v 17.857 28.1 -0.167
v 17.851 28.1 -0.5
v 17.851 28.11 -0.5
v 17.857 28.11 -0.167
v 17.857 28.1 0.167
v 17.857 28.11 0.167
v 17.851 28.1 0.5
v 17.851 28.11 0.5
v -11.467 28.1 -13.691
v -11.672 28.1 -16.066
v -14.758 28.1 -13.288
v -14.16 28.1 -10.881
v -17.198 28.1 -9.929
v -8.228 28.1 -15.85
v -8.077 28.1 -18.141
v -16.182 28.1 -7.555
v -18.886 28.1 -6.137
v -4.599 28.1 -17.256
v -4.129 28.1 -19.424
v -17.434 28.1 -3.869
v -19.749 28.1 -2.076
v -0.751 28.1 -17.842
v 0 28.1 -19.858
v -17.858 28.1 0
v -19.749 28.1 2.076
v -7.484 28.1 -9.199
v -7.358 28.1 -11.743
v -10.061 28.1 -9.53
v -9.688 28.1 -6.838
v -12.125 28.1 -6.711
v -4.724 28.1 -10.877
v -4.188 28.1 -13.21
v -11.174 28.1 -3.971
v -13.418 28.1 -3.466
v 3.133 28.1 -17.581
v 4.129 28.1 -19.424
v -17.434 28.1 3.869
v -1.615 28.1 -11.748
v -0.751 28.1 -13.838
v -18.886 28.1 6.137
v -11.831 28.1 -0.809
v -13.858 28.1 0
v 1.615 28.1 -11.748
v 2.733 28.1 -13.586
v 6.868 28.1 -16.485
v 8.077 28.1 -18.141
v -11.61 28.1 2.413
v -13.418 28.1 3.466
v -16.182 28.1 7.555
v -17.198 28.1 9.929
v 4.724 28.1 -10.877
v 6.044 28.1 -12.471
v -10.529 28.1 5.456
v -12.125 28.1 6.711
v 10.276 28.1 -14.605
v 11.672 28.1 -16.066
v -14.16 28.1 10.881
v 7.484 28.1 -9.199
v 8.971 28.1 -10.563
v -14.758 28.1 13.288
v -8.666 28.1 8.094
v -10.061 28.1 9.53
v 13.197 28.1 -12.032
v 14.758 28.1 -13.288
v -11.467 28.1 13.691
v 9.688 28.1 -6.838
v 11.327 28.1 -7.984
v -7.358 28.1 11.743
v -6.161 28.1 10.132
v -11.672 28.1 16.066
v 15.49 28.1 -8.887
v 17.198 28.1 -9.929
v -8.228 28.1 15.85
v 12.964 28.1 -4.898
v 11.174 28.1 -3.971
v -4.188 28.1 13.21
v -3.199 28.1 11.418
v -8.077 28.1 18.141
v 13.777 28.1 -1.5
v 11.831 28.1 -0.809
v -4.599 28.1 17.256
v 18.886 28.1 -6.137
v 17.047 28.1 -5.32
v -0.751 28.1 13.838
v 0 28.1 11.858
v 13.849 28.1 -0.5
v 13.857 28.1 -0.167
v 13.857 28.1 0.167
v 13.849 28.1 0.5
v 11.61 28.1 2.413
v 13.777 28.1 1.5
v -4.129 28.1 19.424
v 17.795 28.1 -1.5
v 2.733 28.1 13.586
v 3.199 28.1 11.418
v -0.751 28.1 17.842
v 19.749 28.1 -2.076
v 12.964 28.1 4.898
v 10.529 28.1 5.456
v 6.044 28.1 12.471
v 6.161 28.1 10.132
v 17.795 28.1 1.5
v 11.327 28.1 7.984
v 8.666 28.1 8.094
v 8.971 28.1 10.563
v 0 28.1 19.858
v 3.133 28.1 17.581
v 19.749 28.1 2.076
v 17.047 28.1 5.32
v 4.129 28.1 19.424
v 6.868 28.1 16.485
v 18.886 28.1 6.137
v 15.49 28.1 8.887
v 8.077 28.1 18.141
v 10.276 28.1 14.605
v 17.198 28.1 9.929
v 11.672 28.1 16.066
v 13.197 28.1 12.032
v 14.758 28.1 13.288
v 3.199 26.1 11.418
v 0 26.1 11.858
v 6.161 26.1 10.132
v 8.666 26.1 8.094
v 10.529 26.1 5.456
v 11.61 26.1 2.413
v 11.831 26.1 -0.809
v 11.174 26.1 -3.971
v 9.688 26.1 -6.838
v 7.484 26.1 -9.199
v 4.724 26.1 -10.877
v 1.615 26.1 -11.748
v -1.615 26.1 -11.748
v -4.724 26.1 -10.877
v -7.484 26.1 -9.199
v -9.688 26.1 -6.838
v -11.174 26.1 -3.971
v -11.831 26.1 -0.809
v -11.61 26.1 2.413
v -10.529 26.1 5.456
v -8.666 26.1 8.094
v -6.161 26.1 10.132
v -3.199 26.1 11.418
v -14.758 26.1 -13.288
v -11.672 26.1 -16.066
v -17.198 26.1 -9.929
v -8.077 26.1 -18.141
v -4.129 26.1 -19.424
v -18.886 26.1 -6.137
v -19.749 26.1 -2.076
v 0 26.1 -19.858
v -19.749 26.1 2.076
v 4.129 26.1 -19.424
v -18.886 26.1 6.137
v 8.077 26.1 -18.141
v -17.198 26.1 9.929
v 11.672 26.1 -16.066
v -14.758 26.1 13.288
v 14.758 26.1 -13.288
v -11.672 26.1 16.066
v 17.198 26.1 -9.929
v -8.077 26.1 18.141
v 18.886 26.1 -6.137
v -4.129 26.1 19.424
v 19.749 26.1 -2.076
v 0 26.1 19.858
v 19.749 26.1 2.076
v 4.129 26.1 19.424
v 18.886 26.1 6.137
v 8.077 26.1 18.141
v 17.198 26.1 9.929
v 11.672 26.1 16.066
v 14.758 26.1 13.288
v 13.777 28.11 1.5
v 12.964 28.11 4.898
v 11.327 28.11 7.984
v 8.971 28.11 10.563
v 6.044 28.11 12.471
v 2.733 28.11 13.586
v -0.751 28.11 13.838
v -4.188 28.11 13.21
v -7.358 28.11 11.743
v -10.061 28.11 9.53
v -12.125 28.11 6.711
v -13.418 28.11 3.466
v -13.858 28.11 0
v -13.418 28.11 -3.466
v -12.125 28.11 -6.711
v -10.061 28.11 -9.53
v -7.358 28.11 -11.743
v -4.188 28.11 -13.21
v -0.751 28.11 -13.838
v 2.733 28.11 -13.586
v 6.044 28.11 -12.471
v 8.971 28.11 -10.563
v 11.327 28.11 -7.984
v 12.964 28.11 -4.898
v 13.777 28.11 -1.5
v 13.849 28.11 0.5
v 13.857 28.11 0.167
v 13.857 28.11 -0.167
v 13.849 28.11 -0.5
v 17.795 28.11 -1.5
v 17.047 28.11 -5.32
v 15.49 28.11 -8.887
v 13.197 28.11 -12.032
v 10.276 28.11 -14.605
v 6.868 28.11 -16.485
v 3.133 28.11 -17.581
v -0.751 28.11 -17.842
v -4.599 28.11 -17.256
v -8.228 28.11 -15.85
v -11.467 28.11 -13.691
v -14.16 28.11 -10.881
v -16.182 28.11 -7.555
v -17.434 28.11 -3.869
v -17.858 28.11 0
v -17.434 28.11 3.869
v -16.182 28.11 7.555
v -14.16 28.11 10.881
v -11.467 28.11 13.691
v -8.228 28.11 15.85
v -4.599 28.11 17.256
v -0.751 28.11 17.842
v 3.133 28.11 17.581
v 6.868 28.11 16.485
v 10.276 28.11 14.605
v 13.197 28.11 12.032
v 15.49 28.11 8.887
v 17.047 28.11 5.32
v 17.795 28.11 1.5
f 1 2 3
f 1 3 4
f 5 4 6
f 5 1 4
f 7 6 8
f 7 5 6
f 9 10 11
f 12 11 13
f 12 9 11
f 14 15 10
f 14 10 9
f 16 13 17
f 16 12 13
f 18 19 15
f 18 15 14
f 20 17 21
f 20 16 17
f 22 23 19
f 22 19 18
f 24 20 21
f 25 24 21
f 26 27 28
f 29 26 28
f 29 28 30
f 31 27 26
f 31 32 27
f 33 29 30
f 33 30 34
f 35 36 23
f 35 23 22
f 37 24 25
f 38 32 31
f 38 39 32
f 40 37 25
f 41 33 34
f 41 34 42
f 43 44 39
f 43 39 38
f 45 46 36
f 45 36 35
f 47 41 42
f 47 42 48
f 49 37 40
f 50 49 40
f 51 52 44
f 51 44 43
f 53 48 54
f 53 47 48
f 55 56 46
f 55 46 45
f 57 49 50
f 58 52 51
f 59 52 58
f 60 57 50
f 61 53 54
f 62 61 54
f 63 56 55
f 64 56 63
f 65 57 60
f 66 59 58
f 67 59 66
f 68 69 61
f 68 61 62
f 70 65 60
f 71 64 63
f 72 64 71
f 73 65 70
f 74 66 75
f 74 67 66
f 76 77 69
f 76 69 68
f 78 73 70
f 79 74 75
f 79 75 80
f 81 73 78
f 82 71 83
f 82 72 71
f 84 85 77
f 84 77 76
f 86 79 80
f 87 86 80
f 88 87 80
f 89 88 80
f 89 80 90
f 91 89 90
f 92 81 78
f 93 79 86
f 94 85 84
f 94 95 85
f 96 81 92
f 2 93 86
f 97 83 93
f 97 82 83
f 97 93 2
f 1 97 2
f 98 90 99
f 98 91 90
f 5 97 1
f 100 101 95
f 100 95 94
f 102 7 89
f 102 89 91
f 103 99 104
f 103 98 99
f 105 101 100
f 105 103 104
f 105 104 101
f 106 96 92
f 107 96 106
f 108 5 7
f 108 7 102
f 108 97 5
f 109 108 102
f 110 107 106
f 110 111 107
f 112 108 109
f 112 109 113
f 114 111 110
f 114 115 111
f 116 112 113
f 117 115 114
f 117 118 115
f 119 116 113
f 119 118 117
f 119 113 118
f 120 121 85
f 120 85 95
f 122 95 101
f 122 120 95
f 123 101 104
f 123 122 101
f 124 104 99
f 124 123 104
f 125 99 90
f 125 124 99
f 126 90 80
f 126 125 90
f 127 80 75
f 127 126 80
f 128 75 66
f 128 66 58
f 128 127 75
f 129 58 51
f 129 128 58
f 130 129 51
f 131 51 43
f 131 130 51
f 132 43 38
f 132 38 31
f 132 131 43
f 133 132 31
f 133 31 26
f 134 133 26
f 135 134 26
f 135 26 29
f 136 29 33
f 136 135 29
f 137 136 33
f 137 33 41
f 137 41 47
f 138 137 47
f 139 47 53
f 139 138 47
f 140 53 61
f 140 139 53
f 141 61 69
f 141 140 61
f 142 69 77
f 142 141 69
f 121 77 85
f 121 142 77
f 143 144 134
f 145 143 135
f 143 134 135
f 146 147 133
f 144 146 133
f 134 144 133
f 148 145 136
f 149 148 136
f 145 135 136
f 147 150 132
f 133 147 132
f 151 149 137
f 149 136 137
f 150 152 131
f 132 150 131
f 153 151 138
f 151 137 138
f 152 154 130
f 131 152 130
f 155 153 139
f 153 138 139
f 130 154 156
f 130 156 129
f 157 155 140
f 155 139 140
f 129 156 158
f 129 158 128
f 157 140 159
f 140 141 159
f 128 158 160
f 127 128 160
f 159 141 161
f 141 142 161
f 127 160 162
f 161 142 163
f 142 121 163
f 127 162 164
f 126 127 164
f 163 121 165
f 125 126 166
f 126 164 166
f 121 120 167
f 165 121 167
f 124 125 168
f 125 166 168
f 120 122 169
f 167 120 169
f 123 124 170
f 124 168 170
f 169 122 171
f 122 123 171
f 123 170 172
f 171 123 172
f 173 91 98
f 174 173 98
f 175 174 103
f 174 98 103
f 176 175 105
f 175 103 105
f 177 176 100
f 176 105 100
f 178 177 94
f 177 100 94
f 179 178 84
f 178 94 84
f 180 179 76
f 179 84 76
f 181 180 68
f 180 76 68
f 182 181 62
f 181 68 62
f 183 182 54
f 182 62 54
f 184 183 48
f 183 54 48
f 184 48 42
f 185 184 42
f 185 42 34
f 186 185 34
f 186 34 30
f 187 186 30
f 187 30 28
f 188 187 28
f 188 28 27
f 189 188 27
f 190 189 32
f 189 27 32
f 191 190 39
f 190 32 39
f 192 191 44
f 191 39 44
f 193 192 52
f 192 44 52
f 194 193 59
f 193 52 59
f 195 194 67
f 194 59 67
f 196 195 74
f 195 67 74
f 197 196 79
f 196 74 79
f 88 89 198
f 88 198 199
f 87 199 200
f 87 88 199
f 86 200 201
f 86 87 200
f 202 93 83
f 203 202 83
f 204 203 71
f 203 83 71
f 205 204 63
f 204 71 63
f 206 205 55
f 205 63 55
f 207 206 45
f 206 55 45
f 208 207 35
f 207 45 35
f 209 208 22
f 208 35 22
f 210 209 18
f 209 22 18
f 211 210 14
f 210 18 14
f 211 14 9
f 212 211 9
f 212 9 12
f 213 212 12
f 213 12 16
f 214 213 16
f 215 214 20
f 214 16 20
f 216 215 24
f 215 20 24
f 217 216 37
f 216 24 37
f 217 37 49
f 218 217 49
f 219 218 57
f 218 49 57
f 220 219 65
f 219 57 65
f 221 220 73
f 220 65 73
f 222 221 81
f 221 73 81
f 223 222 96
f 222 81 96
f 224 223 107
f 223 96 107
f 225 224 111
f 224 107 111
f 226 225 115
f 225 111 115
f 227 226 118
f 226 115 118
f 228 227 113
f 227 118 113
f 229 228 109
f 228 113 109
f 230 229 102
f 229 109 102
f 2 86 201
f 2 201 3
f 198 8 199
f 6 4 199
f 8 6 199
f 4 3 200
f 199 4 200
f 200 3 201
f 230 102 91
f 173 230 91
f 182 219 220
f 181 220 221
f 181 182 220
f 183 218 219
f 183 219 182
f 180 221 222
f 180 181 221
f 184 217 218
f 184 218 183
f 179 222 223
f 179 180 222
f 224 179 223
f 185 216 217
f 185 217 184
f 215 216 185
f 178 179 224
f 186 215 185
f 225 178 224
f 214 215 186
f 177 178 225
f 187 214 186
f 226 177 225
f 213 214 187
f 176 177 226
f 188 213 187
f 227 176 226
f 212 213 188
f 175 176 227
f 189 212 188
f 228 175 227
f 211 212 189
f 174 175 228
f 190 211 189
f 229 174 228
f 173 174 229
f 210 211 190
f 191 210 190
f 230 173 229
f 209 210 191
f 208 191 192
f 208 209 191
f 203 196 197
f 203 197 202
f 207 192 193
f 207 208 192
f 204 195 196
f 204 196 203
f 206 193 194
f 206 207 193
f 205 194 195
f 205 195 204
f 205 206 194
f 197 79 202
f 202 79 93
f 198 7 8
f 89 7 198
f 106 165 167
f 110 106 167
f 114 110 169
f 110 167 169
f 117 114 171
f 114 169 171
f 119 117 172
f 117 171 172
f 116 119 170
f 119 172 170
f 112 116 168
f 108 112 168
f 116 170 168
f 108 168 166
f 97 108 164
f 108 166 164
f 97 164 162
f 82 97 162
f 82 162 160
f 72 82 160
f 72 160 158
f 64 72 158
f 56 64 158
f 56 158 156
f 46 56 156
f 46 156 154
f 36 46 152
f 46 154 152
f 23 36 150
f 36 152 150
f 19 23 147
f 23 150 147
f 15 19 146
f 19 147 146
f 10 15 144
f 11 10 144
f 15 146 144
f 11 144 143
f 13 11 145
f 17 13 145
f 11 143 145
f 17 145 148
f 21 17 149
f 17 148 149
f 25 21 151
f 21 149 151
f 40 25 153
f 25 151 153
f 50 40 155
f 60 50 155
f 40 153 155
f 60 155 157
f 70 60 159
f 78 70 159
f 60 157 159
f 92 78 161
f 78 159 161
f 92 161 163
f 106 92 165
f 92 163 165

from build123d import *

# Parameters (mm, degrees)
SKETCH_1_R      = 19.858230866
SKETCH_1_R_2    = 11.858230866
EXTRUDE_1_DEPTH = 2
EXTRUDE_3_DEPTH = 0.01


with BuildPart() as part:
    # Эскиз1 → Бобышка-Вытянуть1 (new body)
    with BuildSketch(Plane(origin=(0, 26.1, 0), x_dir=(1, 0, 0), z_dir=(0, 1, 0))):
        with Locations(Location((0, 0, 0), (0, 0, 270))):
            Circle(SKETCH_1_R)
        with Locations(Location((0, 0, 0), (0, 0, 270))):
            Circle(SKETCH_1_R_2, mode=Mode.SUBTRACT)
    extrude(amount=EXTRUDE_1_DEPTH)

    # Эскиз3 → Бобышка-Вытянуть3 (add)
    with BuildSketch(Plane(origin=(0, 28.1, 0), x_dir=(1, 0, 0), z_dir=(0, 1, 0))):
        with BuildLine():
            Line((17.85122992, -0.5), (13.849208019, -0.5))
            ThreePointArc((13.849208019, -0.5), (13.858230866, 0), (13.849208019, 0.5))
            Line((13.849208019, 0.5), (17.85122992, 0.5))
            ThreePointArc((17.85122992, 0.5), (17.858230866, 0), (17.85122992, -0.5))
        make_face()
        with BuildLine():
            Line((17.795123199, -1.5), (13.776812503, -1.5))
            ThreePointArc((13.776812503, -1.5), (-13.858230866, 0), (13.776812503, 1.5))
            Line((13.776812503, 1.5), (17.795123199, 1.5))
            ThreePointArc((17.795123199, 1.5), (-17.858230866, 0), (17.795123199, -1.5))
        make_face()
    extrude(amount=EXTRUDE_3_DEPTH)


solid = part.part
